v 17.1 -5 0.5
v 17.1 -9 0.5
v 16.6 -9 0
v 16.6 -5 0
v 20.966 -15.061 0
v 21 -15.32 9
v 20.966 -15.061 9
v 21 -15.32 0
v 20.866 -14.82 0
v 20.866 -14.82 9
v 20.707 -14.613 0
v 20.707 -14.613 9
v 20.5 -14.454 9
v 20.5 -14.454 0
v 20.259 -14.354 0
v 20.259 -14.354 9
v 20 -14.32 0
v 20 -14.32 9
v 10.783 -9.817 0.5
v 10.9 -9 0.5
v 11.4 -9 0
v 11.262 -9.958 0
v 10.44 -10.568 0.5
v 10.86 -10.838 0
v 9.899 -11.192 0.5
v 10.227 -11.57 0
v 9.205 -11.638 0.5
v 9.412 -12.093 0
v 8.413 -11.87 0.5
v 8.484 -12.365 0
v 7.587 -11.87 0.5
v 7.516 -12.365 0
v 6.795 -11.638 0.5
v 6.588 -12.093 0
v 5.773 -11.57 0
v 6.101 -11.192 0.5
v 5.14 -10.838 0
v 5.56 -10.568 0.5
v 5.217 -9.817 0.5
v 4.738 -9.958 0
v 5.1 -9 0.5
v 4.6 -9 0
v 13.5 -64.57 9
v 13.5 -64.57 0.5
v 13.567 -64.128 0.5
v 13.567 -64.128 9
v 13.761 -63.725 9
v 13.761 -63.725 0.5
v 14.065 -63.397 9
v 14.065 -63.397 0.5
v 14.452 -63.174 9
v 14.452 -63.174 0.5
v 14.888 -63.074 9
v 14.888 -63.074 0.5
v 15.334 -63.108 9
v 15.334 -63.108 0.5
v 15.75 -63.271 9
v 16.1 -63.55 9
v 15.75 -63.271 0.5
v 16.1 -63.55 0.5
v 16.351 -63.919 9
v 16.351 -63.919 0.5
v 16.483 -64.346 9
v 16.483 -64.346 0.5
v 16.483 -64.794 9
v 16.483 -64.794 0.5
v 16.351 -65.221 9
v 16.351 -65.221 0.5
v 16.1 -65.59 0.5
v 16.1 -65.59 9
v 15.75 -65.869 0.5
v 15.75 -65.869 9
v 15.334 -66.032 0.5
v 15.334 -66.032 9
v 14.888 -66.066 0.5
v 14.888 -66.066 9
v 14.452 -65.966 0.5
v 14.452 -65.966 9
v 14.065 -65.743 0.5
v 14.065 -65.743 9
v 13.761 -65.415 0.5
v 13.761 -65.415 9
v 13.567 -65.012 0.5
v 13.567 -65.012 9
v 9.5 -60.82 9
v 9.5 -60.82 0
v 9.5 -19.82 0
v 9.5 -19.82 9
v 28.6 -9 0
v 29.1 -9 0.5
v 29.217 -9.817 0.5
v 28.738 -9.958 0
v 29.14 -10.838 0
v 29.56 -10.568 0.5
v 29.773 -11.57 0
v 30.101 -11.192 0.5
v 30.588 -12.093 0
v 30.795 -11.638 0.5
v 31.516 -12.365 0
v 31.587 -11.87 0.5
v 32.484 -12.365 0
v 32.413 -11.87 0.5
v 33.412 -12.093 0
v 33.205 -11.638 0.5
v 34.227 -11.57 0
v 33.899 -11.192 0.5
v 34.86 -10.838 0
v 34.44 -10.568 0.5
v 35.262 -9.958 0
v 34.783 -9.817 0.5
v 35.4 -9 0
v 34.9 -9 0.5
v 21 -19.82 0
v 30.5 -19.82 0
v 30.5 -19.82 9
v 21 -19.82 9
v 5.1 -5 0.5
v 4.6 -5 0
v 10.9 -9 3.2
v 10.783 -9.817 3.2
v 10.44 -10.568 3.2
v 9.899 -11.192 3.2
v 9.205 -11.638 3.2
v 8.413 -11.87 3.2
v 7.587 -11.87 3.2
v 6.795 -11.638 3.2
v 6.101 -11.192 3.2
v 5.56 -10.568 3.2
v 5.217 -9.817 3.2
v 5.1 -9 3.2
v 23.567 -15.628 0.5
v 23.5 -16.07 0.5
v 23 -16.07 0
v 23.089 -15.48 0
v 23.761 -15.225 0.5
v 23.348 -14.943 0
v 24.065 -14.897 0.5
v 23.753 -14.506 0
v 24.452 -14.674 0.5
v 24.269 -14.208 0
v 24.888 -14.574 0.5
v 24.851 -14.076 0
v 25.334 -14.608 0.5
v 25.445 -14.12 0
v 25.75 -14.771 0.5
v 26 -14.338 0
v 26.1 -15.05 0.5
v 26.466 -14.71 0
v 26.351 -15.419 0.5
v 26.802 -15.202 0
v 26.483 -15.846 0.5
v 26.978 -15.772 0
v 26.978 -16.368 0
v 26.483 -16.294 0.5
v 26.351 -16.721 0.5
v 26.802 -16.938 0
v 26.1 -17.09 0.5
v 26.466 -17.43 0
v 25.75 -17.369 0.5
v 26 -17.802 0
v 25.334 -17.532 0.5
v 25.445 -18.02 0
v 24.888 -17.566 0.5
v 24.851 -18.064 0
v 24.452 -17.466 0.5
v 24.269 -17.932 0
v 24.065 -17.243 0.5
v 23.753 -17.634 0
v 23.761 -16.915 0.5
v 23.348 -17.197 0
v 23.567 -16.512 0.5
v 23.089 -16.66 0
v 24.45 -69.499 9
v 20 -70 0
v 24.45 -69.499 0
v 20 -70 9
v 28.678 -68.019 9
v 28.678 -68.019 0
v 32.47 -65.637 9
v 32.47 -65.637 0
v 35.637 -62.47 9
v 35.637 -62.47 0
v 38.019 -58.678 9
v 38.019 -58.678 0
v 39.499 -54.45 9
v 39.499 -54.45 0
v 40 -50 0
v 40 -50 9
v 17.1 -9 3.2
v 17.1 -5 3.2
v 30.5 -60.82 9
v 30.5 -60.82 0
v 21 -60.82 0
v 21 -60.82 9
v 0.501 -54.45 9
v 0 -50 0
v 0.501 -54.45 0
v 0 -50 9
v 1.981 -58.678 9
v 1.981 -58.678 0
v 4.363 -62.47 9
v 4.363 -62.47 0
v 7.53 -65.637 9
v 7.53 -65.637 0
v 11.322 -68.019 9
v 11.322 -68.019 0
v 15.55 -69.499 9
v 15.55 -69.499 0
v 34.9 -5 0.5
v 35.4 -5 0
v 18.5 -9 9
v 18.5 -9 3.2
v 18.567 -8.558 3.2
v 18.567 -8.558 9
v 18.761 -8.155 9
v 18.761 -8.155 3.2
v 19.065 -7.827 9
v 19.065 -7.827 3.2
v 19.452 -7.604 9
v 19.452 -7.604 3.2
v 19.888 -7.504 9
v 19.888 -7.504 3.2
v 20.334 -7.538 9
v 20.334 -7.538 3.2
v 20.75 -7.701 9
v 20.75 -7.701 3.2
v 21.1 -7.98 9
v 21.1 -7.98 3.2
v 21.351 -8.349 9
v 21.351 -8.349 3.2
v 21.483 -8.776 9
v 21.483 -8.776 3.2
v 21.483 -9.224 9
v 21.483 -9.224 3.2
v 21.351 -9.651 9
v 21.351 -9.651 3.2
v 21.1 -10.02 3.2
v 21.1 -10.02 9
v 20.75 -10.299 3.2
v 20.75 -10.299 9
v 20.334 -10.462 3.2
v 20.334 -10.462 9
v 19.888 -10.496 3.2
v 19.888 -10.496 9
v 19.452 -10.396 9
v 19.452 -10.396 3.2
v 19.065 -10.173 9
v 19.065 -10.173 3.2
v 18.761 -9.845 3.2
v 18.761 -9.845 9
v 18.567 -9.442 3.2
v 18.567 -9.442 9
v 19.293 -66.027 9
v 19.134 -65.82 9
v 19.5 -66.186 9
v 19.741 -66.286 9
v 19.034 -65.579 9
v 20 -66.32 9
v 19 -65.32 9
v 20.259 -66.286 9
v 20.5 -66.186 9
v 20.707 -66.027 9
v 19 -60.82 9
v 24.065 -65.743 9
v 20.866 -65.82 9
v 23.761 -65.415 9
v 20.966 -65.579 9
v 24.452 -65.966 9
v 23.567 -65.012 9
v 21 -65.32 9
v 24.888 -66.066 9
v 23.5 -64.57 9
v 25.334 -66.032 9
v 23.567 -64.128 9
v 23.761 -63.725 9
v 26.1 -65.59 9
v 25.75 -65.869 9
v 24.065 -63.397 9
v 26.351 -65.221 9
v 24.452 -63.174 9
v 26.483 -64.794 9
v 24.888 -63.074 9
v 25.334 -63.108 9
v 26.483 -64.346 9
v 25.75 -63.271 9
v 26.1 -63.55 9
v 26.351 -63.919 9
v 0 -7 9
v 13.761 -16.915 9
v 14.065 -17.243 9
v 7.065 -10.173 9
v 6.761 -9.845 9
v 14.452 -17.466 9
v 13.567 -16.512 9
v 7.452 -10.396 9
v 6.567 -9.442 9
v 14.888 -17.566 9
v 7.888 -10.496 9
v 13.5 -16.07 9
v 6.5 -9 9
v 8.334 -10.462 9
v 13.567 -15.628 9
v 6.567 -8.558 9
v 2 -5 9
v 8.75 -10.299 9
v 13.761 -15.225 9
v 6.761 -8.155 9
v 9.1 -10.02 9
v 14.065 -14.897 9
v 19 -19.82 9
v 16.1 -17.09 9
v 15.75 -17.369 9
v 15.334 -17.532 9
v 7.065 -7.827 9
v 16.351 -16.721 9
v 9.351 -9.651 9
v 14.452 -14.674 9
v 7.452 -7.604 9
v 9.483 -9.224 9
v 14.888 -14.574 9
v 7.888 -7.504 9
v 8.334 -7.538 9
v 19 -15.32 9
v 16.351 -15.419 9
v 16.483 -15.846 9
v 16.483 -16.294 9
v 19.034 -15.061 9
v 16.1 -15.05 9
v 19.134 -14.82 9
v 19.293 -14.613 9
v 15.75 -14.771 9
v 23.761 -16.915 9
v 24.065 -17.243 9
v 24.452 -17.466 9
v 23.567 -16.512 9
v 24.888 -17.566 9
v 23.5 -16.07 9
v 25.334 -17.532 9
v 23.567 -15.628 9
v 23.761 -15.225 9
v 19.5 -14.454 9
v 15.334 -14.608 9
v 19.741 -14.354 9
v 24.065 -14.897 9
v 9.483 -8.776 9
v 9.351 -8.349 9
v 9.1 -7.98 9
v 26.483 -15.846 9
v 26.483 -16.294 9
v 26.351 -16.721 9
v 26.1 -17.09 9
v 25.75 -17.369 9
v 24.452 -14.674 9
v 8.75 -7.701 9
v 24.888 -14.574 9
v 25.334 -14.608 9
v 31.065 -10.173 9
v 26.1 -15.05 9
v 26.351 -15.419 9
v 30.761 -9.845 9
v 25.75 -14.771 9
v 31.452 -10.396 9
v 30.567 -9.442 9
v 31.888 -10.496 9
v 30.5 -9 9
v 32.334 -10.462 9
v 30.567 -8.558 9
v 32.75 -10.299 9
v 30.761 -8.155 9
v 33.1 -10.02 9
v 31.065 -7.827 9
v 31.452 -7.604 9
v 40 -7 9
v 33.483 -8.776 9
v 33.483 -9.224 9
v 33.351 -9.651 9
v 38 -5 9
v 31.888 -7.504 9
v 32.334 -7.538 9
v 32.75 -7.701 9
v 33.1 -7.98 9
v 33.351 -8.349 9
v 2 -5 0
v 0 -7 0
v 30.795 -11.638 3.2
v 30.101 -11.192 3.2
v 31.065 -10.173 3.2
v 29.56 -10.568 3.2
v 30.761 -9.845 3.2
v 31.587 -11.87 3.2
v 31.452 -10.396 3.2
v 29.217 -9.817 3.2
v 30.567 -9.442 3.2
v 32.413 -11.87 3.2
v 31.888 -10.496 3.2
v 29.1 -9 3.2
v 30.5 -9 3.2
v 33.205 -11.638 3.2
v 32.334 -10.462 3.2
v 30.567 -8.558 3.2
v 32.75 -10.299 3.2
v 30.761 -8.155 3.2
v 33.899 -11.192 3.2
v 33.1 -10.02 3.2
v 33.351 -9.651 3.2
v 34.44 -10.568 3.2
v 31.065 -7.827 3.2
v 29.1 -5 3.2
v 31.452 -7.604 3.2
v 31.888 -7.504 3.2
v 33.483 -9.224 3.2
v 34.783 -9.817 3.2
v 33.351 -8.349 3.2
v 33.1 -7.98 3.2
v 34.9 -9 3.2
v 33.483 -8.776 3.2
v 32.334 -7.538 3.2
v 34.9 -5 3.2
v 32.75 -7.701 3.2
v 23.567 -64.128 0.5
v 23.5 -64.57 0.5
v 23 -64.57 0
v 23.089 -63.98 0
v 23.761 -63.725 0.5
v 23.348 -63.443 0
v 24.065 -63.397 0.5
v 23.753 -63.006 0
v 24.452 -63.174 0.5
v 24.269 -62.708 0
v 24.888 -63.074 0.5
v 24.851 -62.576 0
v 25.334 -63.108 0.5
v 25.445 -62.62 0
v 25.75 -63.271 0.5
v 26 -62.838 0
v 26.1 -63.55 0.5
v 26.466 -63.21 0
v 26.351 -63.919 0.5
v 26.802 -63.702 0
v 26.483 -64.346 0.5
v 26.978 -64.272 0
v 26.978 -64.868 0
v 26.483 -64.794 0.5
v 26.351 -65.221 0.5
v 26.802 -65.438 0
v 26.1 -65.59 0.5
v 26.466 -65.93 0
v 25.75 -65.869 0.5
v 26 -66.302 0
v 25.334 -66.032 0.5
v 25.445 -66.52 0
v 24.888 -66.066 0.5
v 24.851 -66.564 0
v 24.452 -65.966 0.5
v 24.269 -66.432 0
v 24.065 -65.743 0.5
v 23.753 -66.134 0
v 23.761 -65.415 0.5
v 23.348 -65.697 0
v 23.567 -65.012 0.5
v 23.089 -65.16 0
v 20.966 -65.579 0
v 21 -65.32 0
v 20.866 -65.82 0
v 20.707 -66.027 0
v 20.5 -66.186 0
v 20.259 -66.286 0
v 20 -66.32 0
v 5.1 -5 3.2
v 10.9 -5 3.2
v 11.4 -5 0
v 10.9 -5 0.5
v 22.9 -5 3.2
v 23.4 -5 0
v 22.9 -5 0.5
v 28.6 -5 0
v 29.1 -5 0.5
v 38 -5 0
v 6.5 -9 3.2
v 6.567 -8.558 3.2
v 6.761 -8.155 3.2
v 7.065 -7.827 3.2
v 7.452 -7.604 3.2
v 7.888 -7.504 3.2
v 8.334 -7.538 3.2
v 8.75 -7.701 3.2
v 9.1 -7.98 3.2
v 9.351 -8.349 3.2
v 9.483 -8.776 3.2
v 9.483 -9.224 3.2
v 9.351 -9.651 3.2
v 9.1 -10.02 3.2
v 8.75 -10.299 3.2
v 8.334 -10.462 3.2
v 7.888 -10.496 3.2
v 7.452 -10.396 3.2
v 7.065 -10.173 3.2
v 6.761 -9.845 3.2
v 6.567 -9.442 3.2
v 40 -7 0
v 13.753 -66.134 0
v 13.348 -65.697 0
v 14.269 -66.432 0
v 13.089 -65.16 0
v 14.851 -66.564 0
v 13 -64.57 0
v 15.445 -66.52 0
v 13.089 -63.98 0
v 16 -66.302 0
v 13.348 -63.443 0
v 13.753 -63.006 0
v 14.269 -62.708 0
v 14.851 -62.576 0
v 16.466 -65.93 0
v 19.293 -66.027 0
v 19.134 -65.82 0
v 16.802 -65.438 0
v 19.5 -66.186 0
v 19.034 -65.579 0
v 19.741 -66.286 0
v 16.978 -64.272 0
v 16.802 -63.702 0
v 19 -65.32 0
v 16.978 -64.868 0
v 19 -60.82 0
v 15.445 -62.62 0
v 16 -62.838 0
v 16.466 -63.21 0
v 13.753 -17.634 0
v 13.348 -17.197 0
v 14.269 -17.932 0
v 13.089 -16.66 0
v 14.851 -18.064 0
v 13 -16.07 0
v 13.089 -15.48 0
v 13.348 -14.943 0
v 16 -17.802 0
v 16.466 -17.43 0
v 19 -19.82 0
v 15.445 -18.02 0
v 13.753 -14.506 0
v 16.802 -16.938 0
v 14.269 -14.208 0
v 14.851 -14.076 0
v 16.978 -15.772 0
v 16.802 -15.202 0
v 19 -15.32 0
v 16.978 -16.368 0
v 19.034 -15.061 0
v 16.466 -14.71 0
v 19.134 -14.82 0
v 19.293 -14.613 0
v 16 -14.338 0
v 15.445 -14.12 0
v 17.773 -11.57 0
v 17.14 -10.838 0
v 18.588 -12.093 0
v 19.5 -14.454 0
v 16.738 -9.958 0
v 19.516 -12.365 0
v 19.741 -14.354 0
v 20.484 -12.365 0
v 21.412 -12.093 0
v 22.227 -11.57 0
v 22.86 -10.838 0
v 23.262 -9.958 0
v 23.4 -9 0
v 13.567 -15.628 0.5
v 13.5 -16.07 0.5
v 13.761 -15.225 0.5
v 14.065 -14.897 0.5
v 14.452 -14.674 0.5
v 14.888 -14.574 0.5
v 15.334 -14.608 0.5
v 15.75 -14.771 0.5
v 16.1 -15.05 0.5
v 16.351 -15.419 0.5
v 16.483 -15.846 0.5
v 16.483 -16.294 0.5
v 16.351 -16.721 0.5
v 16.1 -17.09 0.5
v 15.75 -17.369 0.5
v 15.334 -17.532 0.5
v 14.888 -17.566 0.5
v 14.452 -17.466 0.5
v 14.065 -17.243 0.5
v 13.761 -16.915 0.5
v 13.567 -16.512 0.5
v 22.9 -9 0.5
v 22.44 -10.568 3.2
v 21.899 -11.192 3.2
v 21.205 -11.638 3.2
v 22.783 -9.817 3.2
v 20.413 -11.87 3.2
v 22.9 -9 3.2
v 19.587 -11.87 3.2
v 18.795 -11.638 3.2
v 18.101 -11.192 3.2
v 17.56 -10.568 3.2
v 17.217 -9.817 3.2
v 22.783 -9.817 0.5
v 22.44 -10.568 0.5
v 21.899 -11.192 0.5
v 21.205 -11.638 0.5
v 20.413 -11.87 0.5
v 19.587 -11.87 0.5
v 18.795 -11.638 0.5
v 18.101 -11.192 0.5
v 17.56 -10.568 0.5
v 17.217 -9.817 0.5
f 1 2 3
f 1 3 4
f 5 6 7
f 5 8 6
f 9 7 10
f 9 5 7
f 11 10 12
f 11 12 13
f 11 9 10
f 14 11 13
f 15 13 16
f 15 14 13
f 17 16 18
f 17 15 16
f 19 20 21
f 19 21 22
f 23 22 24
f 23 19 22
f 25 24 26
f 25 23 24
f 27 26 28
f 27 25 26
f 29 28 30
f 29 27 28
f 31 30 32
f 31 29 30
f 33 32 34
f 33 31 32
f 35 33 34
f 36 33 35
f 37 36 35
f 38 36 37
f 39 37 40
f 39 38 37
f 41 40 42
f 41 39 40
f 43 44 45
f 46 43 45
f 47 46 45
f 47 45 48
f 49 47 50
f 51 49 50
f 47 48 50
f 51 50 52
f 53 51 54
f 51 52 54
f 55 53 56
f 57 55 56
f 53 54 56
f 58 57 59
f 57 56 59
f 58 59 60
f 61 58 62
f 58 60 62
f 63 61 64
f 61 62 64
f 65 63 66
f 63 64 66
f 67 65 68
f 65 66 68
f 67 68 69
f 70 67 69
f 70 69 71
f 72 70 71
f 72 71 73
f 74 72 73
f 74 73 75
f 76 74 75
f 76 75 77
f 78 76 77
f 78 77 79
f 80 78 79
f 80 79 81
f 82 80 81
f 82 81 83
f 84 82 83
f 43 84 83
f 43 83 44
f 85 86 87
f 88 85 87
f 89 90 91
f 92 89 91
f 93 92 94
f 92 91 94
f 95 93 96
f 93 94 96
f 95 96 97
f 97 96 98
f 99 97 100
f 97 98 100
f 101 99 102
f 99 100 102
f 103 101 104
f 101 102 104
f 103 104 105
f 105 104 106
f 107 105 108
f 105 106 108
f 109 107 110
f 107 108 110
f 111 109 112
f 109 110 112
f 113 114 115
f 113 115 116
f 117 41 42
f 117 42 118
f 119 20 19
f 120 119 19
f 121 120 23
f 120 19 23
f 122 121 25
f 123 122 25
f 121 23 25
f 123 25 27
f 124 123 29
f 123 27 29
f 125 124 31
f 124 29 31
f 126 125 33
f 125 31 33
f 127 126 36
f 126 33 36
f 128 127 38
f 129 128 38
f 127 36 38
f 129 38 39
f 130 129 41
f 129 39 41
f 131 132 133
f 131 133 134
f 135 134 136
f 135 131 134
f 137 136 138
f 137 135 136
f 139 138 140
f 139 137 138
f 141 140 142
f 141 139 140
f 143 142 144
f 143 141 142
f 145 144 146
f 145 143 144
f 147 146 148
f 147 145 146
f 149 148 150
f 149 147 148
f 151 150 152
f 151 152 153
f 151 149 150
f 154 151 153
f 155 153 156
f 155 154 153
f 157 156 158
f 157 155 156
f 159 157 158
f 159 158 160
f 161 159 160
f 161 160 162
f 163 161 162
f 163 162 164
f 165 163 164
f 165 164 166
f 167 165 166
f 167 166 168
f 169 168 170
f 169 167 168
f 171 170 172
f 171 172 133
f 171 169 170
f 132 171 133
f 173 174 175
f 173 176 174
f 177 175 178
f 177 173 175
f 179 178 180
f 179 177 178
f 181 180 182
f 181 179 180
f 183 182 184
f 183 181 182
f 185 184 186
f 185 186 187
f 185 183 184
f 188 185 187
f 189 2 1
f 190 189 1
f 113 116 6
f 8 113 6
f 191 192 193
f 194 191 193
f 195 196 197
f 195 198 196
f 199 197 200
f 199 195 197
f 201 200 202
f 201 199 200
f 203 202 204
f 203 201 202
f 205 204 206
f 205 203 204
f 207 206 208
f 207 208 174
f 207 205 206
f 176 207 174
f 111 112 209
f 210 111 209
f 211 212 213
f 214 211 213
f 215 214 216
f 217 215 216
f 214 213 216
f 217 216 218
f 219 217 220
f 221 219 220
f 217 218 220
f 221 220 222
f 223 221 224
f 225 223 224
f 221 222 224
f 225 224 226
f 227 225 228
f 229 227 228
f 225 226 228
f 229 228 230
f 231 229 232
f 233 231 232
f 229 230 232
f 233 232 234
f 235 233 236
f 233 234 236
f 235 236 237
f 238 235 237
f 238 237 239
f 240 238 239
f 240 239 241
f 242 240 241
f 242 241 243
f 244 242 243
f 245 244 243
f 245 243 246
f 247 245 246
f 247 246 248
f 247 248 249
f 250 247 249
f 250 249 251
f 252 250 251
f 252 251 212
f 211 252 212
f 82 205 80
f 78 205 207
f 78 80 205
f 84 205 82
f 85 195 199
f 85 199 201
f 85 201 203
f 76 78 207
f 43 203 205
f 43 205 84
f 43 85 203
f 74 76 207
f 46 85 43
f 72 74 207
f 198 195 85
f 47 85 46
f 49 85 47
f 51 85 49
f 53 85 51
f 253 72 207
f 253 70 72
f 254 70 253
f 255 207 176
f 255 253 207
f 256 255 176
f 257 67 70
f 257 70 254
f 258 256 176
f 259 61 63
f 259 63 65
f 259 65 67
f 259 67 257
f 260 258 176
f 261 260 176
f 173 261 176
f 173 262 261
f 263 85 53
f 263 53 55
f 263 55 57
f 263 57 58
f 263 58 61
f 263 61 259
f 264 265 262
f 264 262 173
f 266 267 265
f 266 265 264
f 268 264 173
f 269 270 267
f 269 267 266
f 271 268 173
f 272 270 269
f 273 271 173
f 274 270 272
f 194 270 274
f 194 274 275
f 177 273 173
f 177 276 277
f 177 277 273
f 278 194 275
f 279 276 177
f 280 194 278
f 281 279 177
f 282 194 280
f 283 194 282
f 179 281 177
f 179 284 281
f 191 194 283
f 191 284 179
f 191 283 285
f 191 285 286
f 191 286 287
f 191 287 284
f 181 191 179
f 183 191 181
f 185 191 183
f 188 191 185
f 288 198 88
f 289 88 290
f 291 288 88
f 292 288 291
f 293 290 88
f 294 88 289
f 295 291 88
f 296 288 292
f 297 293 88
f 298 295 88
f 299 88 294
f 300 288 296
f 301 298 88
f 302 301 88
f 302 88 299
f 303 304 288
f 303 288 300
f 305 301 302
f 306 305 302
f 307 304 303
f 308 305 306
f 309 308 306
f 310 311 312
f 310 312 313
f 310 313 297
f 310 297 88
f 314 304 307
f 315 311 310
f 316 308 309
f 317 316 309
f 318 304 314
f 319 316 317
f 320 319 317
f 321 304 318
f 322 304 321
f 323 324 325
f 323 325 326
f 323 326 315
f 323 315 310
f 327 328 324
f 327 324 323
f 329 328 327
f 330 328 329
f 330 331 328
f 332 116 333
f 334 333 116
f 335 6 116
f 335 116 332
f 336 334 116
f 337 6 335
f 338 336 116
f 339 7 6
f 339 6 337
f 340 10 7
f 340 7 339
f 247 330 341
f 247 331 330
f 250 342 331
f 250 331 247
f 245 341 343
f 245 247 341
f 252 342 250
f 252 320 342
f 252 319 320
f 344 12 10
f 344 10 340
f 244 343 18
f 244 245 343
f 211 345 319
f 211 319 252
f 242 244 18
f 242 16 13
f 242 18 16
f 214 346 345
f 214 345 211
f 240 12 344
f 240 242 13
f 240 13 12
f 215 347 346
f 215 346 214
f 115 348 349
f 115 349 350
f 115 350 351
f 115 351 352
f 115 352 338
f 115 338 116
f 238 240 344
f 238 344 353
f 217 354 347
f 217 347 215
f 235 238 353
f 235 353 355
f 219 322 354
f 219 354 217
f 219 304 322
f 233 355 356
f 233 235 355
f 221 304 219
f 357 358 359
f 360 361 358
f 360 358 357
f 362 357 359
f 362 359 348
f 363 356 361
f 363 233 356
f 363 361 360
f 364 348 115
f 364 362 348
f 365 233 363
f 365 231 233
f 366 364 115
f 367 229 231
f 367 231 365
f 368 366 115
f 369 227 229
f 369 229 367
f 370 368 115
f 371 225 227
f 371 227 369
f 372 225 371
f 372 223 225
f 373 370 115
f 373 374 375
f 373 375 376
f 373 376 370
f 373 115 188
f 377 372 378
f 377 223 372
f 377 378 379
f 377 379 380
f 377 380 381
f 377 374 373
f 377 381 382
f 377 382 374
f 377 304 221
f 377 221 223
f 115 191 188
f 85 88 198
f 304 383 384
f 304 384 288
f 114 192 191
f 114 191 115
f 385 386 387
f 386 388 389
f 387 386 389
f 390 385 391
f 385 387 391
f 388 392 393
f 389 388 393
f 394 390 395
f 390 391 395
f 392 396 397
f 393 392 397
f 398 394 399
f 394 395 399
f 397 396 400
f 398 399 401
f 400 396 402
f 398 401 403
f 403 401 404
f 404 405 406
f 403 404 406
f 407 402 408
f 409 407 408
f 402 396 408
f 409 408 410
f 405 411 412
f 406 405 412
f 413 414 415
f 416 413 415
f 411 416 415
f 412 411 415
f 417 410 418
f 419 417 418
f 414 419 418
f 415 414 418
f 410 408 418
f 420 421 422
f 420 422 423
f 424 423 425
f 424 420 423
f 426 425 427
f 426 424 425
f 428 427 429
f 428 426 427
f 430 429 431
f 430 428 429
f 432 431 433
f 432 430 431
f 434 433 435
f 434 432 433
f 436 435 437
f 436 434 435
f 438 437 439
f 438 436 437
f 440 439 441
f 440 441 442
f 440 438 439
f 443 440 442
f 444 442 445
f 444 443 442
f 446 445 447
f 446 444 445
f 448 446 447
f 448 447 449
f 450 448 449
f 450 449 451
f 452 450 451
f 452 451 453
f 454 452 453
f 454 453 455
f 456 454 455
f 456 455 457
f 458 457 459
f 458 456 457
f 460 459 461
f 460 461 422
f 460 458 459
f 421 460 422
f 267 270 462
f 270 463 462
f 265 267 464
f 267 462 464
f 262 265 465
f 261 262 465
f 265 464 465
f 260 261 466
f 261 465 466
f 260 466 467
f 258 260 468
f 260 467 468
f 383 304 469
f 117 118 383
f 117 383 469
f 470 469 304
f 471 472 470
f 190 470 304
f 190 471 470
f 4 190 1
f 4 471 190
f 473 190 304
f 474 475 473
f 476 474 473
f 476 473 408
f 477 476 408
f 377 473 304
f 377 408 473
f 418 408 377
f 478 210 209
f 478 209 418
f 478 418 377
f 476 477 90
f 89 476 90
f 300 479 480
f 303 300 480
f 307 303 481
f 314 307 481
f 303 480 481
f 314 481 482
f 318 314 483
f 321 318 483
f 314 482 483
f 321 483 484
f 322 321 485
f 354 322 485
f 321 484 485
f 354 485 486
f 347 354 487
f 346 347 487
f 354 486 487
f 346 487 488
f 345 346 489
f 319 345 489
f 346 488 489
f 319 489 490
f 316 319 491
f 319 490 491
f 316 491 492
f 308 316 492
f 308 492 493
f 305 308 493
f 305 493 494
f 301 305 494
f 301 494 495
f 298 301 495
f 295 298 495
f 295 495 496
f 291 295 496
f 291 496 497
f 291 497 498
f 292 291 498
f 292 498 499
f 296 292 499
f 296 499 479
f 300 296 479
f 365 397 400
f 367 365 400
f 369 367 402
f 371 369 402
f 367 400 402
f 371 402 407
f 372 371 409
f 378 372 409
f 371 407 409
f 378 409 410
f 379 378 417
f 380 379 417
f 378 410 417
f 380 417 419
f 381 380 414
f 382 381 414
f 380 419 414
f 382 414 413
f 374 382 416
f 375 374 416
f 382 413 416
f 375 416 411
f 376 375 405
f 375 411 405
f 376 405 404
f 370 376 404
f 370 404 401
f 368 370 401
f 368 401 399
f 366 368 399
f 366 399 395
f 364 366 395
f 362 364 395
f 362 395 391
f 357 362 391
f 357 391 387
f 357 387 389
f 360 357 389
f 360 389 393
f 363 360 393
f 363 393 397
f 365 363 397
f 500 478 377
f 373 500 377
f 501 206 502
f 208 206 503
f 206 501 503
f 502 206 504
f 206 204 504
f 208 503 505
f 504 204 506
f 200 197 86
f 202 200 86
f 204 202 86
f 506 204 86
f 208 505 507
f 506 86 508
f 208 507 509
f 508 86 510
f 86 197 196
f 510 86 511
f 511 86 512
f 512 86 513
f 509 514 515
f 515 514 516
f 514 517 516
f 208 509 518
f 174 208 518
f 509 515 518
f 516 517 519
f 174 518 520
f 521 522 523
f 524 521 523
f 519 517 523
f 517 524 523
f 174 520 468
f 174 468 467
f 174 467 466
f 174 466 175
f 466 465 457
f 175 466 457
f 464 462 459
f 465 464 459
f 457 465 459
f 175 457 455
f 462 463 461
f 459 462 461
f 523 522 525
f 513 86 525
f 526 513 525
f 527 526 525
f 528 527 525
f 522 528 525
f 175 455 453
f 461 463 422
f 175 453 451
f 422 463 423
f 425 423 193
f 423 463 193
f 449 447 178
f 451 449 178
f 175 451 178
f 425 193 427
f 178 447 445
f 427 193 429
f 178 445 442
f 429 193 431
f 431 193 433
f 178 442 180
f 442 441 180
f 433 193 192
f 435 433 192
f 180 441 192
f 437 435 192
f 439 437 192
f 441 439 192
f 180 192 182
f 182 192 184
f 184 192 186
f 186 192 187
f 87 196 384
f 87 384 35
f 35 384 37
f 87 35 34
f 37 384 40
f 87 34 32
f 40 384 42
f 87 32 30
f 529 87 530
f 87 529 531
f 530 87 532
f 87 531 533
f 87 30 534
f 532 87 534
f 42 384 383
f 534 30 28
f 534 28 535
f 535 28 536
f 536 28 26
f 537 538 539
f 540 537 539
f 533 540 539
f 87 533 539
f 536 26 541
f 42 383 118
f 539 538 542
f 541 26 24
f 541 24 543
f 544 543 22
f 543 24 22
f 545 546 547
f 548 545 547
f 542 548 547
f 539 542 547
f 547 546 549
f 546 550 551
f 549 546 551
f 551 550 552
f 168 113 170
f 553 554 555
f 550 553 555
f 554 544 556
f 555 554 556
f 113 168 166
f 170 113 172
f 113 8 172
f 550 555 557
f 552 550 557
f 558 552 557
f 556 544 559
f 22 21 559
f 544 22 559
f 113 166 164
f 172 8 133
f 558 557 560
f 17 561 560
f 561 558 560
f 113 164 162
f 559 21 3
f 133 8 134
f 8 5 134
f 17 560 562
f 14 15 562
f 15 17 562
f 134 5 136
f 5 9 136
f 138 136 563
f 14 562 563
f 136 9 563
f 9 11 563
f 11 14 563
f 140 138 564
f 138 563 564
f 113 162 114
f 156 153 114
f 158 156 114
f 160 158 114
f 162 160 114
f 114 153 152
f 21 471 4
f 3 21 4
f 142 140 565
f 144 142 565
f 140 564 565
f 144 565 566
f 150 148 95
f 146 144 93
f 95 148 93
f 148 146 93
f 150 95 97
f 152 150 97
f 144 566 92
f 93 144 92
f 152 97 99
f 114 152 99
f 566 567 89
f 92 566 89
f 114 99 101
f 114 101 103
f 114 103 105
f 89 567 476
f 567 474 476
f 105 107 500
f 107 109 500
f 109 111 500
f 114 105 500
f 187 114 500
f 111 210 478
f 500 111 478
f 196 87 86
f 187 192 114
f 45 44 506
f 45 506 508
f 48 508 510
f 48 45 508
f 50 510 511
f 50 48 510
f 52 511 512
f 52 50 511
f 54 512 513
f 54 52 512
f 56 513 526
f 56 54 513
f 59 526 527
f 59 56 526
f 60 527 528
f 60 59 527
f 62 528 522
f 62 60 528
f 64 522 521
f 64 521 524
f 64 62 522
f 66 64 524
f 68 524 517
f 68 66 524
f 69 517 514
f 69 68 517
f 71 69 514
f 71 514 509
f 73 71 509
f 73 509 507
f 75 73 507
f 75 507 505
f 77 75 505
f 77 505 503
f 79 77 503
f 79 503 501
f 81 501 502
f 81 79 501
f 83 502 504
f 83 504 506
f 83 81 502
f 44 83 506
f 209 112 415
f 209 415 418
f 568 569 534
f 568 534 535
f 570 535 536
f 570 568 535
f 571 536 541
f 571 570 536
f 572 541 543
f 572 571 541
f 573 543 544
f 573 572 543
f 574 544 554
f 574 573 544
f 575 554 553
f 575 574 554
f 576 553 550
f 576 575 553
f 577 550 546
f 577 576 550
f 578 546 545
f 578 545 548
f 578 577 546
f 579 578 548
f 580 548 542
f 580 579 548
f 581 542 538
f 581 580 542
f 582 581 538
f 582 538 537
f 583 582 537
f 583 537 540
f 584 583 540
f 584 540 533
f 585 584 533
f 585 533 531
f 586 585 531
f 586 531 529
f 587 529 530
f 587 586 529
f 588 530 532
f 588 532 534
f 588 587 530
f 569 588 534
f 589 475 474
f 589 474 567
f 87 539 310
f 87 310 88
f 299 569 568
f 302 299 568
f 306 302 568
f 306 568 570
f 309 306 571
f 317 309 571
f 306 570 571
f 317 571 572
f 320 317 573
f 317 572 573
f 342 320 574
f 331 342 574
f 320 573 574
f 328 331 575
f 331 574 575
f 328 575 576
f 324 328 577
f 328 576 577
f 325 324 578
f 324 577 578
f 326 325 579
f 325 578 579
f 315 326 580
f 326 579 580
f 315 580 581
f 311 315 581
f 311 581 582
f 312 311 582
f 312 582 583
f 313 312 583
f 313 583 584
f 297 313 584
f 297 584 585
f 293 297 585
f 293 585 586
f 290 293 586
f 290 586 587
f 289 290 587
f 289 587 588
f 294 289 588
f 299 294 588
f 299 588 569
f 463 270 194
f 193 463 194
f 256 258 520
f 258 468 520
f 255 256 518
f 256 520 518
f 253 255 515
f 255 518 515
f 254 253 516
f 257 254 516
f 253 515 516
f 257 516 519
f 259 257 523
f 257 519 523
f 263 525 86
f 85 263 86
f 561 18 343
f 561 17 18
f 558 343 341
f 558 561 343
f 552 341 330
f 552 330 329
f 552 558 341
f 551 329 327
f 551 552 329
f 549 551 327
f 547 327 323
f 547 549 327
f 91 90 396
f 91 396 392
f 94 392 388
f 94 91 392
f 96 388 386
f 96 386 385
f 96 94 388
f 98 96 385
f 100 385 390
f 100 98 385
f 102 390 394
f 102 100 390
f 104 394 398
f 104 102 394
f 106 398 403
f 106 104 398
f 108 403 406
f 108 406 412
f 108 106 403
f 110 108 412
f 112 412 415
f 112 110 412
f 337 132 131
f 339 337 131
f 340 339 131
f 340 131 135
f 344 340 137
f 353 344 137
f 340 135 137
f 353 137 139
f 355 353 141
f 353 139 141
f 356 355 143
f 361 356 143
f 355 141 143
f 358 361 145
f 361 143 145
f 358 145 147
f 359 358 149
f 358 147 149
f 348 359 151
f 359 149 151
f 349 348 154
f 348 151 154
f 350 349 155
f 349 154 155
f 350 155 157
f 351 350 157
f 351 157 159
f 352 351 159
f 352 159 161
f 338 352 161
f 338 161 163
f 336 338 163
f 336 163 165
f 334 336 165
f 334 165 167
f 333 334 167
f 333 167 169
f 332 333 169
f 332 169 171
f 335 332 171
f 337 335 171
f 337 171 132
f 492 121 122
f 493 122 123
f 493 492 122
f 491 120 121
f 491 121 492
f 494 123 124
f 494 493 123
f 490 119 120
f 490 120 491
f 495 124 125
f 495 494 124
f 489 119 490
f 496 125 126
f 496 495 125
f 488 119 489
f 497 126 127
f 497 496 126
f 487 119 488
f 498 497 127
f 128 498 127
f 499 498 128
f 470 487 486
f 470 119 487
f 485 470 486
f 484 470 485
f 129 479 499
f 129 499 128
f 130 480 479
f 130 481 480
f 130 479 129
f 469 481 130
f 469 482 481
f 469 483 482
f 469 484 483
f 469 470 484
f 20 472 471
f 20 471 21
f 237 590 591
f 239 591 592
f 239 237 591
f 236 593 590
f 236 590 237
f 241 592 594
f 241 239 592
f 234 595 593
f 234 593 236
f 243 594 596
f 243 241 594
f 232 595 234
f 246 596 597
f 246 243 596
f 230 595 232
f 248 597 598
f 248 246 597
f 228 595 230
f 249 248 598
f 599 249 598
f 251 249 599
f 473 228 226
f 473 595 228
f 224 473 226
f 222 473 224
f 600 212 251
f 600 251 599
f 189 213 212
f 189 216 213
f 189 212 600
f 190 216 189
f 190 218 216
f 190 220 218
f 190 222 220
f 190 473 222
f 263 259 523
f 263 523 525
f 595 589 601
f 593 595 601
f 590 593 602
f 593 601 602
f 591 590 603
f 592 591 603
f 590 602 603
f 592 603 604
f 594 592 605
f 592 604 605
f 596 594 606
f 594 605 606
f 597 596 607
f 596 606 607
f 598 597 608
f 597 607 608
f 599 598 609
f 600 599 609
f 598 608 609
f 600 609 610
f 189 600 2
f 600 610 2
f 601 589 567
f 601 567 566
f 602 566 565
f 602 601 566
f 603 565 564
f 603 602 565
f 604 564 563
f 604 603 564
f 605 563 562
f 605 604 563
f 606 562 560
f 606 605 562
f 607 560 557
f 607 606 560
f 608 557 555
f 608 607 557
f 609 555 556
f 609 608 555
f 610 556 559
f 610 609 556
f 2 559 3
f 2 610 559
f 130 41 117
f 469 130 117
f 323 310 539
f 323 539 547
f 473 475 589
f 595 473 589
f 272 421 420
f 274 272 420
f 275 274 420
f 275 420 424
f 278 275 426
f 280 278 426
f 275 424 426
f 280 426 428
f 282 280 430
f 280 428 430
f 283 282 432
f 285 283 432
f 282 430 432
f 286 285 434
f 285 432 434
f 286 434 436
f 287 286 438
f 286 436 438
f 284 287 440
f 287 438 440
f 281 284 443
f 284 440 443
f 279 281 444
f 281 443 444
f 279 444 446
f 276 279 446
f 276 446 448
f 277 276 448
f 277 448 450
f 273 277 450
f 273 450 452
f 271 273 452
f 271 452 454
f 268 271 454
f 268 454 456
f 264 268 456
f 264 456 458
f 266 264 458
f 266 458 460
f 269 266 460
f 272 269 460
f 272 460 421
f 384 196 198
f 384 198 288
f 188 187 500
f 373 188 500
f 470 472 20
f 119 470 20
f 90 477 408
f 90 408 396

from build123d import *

# Parameters (mm, degrees)
SKETCH_1_W          = 40
SKETCH_1_H          = 65
EXTRUDE_1_DEPTH     = 9
CHAMFER_1_SIZE      = 2
FILLET_3_R          = 20
SKETCH_2_W          = 21
SKETCH_2_H          = 41
CUT_EXTRUDE_1_DEPTH = 10
SKETCH_3_W          = 2
SKETCH_3_H          = 5.5
CUT_EXTRUDE_2_DEPTH = 10
SKETCH_4_R          = 1.5
CUT_EXTRUDE_3_DEPTH = 10
SKETCH_5_R          = 1.5
CUT_EXTRUDE_4_DEPTH = 10
FILLET_4_R          = 1
CUT_EXTRUDE_5_DEPTH = 3.2
CHAMFER_2_SIZE      = 0.5


with BuildPart() as part:
    # 草图1 → 凸台-拉伸1 (new body)
    with BuildSketch(Plane.XY):
        with Locations((20, -37.5)):
            Rectangle(SKETCH_1_W, SKETCH_1_H)
    extrude(amount=EXTRUDE_1_DEPTH)

    # 倒角1
    chamfer_1_edges = [part.edges().sort_by_distance(p)[0] for p in [
        (0, -5, 4.5),
        (40, -5, 4.5),
    ]]
    chamfer(chamfer_1_edges, length=CHAMFER_1_SIZE)

    # 圆角3
    fillet_3_edges = [part.edges().sort_by_distance(p)[0] for p in [
        (0, -70, 4.5),
        (40, -70, 4.5),
    ]]
    fillet(fillet_3_edges, radius=FILLET_3_R - 0.0001)  # a hair under: the kernel refuses the full size

    # 草图2 → 切除-拉伸1 (cut)
    with BuildSketch(Plane(origin=(0, 0, 0), x_dir=(-1, 0, 0), z_dir=(0, 0, -1))):
        with Locations((-20, -40.32)):
            Rectangle(SKETCH_2_W, SKETCH_2_H)
    extrude(amount=-CUT_EXTRUDE_1_DEPTH, mode=Mode.SUBTRACT)

    # 草图3 → 切除-拉伸2 (cut)
    with BuildSketch(Plane.XY.offset(9)):
        with Locations((20, -17.07)):
            Rectangle(SKETCH_3_W, SKETCH_3_H)
        with Locations((20, -63.57)):
            Rectangle(SKETCH_3_W, SKETCH_3_H)
    extrude(amount=-CUT_EXTRUDE_2_DEPTH, mode=Mode.SUBTRACT)

    # 草图4 → 切除-拉伸3 (cut)
    with BuildSketch(Plane(origin=(0, 0, 0), x_dir=(-1, 0, 0), z_dir=(0, 0, -1))):
        with Locations((-25, -16.07)):
            Circle(SKETCH_4_R)
        with Locations((-15, -16.07)):
            Circle(SKETCH_4_R)
        with Locations((-25, -64.57)):
            Circle(SKETCH_4_R)
        with Locations((-15, -64.57)):
            Circle(SKETCH_4_R)
    extrude(amount=-CUT_EXTRUDE_3_DEPTH, mode=Mode.SUBTRACT)

    # 草图5 → 切除-拉伸4 (cut)
    with BuildSketch(Plane(origin=(0, 0, 0), x_dir=(-1, 0, 0), z_dir=(0, 0, -1))):
        with Locations((-32, -9)):
            Circle(SKETCH_5_R)
        with Locations((-20, -9)):
            Circle(SKETCH_5_R)
        with Locations((-8, -9)):
            Circle(SKETCH_5_R)
    extrude(amount=-CUT_EXTRUDE_4_DEPTH, mode=Mode.SUBTRACT)

    # 圆角4
    fillet_4_edges = [part.edges().sort_by_distance(p)[0] for p in [
        (21, -66.32, 4.5),
        (19, -66.32, 4.5),
        (21, -14.32, 4.5),
        (19, -14.32, 4.5),
    ]]
    fillet(fillet_4_edges, radius=FILLET_4_R - 0.0001)  # a hair under: the kernel refuses the full size

    # 草图7 → 切除-拉伸5 (cut)
    with BuildSketch(Plane(origin=(0, 0, 0), x_dir=(-1, 0, 0), z_dir=(0, 0, -1))):
        with BuildLine():
            Line((-34.9, -9), (-34.9, -5))
            Line((-34.9, -5), (-29.1, -5))
            Line((-29.1, -5), (-29.1, -9))
            ThreePointArc((-29.1, -9), (-32, -11.9), (-34.9, -9))
        make_face()
        with BuildLine():
            Line((-17.1, -9), (-17.1, -5))
            Line((-17.1, -5), (-22.9, -5))
            Line((-22.9, -5), (-22.9, -9))
            ThreePointArc((-22.9, -9), (-20, -11.9), (-17.1, -9))
        make_face()
        with BuildLine():
            Line((-5.1, -9), (-5.1, -5))
            Line((-5.1, -5), (-10.9, -5))
            Line((-10.9, -5), (-10.9, -9))
            ThreePointArc((-10.9, -9), (-8, -11.9), (-5.1, -9))
        make_face()
    extrude(amount=-CUT_EXTRUDE_5_DEPTH, mode=Mode.SUBTRACT)

    # 倒角2
    chamfer_2_edges = [part.edges().sort_by_distance(p)[0] for p in [
        (16.5, -16.07, 0),
        (26.5, -64.57, 0),
        (16.5, -64.57, 0),
        (26.5, -16.07, 0),
        (32, -11.9, 0),
        (29.1, -7, 0),
        (34.9, -7, 0),
        (20, -11.9, 0),
        (17.1, -7, 0),
        (22.9, -7, 0),
        (8, -11.9, 0),
        (5.1, -7, 0),
        (10.9, -7, 0),
    ]]
    chamfer(chamfer_2_edges, length=CHAMFER_2_SIZE)


solid = part.part
